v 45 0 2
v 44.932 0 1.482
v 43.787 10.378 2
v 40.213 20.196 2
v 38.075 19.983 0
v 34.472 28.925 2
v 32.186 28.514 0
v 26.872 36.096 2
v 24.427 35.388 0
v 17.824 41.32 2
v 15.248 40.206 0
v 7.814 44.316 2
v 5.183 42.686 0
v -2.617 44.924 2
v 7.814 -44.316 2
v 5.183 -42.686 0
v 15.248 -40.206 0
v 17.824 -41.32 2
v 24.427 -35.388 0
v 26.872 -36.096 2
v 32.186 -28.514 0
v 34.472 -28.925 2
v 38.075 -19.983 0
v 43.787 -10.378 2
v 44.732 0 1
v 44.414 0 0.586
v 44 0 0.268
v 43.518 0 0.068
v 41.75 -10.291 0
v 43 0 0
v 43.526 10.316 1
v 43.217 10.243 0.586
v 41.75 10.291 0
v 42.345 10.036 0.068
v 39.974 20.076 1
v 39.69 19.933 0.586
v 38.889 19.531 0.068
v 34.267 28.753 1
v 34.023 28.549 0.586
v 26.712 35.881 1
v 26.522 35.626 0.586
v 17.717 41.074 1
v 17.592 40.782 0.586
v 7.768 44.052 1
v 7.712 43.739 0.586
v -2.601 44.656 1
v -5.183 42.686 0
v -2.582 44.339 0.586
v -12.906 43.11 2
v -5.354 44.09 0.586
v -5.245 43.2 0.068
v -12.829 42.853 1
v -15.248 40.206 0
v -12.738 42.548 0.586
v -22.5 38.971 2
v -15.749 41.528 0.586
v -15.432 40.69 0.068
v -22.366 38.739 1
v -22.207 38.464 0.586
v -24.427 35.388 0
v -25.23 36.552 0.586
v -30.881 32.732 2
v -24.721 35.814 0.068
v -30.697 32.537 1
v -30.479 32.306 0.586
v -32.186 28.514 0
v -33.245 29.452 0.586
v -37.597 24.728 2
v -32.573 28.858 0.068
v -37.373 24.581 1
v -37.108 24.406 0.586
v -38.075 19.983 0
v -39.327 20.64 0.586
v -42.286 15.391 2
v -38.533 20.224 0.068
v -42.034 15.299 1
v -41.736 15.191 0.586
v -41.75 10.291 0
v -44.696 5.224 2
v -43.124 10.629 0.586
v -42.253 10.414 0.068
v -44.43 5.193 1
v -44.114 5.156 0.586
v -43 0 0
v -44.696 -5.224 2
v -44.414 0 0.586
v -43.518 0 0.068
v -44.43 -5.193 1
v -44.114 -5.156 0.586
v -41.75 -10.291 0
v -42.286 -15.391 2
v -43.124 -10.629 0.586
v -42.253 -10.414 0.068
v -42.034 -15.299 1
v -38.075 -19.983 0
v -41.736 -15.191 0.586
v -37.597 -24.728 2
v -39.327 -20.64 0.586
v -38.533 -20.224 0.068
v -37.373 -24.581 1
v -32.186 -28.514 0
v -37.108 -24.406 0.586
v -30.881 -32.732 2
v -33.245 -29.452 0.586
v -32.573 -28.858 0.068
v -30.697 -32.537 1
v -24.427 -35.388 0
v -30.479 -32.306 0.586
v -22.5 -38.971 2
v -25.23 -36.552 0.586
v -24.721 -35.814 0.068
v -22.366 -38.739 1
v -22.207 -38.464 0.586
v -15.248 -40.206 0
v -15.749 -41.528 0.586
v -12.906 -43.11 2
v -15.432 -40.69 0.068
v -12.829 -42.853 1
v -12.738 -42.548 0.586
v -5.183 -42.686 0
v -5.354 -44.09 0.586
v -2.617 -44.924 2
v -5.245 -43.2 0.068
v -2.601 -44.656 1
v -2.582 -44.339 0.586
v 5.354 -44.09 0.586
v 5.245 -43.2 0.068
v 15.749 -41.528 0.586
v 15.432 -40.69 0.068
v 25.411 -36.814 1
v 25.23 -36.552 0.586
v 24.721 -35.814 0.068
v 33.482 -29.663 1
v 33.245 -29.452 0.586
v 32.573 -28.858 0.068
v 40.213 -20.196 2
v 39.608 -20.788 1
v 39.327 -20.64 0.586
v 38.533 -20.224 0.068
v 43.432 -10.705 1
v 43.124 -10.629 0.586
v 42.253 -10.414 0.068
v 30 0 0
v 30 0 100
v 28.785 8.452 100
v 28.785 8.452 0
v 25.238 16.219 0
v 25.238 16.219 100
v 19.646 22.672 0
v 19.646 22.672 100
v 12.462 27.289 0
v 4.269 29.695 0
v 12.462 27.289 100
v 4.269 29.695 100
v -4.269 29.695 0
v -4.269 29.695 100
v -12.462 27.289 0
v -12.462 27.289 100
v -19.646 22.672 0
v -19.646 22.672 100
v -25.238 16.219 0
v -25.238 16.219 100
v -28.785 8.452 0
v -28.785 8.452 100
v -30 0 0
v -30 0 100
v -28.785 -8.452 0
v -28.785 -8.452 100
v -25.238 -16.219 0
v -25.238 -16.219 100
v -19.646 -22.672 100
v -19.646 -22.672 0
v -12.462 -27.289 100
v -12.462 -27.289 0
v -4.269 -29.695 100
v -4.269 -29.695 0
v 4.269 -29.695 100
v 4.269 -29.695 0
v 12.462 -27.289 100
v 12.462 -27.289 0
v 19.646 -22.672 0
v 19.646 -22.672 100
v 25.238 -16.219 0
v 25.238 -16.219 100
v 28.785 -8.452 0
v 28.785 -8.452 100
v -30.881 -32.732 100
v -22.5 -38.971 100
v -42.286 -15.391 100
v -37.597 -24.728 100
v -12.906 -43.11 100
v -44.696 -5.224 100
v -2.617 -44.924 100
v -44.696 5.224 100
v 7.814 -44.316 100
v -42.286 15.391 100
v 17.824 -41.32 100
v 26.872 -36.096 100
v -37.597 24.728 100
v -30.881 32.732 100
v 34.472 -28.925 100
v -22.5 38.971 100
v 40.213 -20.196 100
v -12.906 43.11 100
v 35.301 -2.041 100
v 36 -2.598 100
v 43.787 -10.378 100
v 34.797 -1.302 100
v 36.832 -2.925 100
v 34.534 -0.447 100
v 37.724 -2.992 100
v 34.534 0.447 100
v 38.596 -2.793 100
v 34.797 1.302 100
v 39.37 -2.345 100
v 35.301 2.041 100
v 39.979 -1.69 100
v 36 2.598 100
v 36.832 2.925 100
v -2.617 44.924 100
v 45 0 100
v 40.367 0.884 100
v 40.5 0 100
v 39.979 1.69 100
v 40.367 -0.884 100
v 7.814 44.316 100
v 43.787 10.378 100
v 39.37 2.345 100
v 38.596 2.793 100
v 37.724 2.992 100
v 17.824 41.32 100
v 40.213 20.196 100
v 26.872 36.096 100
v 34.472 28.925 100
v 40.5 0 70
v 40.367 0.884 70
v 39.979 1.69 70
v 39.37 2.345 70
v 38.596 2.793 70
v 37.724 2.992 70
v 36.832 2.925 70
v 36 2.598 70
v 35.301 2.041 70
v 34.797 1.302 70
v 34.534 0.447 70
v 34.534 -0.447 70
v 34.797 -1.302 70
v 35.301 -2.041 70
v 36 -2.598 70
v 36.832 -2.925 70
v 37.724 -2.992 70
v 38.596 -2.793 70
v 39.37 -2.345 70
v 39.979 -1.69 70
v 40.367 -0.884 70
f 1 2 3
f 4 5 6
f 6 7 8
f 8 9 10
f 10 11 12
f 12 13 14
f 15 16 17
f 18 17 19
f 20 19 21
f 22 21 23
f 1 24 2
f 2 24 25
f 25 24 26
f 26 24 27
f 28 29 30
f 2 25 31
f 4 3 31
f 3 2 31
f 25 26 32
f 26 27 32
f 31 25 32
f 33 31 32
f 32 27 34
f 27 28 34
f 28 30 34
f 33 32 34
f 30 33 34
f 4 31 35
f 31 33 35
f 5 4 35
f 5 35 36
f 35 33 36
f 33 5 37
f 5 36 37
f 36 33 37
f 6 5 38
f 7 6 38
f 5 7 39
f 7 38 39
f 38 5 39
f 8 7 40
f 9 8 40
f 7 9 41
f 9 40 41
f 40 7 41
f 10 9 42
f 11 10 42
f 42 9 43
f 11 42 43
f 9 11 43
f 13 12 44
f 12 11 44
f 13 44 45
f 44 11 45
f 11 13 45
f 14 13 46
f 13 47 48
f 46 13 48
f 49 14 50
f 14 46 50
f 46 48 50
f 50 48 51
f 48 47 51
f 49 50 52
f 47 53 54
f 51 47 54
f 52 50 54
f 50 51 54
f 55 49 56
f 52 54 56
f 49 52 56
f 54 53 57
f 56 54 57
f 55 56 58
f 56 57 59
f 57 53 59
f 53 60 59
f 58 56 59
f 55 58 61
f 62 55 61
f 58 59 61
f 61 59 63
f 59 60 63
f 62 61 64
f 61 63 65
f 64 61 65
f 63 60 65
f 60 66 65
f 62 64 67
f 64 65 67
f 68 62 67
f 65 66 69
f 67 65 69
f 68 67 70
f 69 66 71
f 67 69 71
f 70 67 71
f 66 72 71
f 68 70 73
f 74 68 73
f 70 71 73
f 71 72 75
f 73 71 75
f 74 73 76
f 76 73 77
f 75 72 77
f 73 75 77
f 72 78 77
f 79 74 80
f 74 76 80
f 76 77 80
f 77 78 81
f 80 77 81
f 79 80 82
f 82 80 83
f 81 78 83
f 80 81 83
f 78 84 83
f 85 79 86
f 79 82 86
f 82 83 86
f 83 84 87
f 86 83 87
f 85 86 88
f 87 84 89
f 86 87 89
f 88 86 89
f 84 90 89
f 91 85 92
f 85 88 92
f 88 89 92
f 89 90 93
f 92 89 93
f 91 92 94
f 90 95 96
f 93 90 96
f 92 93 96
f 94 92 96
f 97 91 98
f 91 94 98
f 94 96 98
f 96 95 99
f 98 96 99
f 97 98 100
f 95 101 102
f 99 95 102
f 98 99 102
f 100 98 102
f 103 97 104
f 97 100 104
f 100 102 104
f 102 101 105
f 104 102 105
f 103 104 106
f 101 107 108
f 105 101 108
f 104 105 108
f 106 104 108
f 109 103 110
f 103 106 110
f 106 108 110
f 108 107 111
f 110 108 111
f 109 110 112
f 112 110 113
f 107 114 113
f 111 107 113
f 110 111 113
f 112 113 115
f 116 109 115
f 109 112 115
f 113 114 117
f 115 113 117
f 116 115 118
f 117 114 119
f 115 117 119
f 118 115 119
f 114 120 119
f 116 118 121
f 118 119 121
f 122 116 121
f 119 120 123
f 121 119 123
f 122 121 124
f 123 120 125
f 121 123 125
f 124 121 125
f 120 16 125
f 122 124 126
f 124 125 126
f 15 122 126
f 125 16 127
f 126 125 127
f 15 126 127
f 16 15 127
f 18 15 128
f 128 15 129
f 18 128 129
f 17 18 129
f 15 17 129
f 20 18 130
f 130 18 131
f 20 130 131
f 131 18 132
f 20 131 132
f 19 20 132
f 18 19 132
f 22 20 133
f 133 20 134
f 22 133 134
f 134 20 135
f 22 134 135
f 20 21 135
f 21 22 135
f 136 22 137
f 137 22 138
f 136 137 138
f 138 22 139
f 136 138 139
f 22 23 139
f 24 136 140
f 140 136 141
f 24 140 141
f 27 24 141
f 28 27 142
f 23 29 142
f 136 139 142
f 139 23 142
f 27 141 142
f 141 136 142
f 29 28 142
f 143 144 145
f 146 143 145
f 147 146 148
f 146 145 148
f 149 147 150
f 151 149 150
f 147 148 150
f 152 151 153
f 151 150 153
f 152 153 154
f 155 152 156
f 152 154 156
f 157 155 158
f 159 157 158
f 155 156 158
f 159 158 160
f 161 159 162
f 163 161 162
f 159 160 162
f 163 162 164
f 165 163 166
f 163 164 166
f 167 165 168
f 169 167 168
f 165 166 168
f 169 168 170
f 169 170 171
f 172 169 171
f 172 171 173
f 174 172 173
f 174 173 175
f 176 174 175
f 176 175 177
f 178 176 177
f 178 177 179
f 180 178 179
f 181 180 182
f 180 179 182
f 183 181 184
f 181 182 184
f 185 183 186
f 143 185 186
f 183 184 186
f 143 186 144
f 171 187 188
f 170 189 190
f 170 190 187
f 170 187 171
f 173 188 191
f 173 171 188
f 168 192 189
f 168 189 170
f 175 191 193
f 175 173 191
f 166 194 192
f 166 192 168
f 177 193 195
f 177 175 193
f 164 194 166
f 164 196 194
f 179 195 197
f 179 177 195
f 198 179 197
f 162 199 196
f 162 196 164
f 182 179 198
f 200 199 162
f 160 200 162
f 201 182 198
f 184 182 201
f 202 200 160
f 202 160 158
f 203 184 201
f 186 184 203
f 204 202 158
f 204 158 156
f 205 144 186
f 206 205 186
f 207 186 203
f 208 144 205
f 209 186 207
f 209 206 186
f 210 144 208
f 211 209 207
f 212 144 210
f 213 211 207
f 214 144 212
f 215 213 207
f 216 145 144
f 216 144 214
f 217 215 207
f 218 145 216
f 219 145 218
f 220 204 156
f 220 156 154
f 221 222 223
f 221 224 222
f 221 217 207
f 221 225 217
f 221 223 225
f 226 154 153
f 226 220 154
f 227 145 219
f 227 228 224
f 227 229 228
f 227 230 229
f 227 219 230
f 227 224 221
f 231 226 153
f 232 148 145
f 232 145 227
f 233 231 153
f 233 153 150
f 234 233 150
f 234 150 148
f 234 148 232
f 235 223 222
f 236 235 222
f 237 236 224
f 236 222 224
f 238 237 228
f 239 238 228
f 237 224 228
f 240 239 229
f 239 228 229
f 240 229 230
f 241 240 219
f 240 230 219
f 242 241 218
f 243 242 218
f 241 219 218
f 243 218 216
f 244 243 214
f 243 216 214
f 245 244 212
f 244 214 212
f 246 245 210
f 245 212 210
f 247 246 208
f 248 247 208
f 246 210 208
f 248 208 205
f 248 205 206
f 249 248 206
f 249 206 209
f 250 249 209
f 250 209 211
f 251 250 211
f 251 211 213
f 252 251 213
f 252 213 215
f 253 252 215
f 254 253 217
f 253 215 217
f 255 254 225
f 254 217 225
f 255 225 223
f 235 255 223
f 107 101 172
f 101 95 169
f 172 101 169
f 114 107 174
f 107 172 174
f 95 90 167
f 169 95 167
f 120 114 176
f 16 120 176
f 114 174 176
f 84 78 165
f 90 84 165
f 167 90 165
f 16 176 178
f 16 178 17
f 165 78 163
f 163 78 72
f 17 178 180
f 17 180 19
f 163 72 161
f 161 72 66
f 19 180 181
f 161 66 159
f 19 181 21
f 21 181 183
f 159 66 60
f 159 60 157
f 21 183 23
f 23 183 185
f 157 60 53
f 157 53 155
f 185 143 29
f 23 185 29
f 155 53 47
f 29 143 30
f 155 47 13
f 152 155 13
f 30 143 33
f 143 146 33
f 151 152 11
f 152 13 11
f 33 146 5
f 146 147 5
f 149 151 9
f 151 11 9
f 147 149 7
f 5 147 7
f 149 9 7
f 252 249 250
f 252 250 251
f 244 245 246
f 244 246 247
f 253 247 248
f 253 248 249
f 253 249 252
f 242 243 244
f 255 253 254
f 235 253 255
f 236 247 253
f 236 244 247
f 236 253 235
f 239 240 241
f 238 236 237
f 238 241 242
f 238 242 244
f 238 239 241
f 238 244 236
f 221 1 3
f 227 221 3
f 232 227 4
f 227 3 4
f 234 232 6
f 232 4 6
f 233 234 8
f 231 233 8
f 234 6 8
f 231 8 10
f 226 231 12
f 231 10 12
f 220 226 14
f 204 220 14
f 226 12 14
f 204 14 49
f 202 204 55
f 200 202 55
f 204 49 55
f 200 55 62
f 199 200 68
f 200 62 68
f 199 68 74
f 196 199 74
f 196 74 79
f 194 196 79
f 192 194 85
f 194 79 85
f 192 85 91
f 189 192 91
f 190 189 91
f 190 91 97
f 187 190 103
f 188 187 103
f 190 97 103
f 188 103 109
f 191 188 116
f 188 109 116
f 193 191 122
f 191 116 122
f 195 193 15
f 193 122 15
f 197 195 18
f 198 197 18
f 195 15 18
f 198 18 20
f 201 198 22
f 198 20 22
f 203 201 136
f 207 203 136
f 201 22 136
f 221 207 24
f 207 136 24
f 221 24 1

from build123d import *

# Parameters (mm, degrees)
ESQUISSE1_R             = 45
BASE_EXTRUSION_DEPTH    = 100
ESQUISSE2_R             = 30
ENL_V_MAT_EXTRU_1_DEPTH = 100
ESQUISSE3_R             = 3
ENL_V_MAT_EXTRU_2_DEPTH = 30
CONG_1_R                = 2


with BuildPart() as part:
    # Esquisse1 → Base-Extrusion (new body)
    with BuildSketch(Plane.XY):
        Circle(ESQUISSE1_R)
    extrude(amount=BASE_EXTRUSION_DEPTH)

    # Esquisse2 → Enlèv. mat.-Extru.1 (cut)
    with BuildSketch(Plane.XY.offset(100)):
        Circle(ESQUISSE2_R)
    extrude(amount=-ENL_V_MAT_EXTRU_1_DEPTH, mode=Mode.SUBTRACT)

    # Esquisse3 → Enlèv. mat.-Extru.2 (cut)
    with BuildSketch(Plane.XY.offset(100)):
        with Locations((37.5, 0)):
            Circle(ESQUISSE3_R)
    extrude(amount=-ENL_V_MAT_EXTRU_2_DEPTH, mode=Mode.SUBTRACT)

    # Congé1
    cong_1_edges = [part.edges().sort_by_distance(p)[0] for p in [
        (-45, 0, 0),
    ]]
    fillet(cong_1_edges, radius=CONG_1_R)


solid = part.part
